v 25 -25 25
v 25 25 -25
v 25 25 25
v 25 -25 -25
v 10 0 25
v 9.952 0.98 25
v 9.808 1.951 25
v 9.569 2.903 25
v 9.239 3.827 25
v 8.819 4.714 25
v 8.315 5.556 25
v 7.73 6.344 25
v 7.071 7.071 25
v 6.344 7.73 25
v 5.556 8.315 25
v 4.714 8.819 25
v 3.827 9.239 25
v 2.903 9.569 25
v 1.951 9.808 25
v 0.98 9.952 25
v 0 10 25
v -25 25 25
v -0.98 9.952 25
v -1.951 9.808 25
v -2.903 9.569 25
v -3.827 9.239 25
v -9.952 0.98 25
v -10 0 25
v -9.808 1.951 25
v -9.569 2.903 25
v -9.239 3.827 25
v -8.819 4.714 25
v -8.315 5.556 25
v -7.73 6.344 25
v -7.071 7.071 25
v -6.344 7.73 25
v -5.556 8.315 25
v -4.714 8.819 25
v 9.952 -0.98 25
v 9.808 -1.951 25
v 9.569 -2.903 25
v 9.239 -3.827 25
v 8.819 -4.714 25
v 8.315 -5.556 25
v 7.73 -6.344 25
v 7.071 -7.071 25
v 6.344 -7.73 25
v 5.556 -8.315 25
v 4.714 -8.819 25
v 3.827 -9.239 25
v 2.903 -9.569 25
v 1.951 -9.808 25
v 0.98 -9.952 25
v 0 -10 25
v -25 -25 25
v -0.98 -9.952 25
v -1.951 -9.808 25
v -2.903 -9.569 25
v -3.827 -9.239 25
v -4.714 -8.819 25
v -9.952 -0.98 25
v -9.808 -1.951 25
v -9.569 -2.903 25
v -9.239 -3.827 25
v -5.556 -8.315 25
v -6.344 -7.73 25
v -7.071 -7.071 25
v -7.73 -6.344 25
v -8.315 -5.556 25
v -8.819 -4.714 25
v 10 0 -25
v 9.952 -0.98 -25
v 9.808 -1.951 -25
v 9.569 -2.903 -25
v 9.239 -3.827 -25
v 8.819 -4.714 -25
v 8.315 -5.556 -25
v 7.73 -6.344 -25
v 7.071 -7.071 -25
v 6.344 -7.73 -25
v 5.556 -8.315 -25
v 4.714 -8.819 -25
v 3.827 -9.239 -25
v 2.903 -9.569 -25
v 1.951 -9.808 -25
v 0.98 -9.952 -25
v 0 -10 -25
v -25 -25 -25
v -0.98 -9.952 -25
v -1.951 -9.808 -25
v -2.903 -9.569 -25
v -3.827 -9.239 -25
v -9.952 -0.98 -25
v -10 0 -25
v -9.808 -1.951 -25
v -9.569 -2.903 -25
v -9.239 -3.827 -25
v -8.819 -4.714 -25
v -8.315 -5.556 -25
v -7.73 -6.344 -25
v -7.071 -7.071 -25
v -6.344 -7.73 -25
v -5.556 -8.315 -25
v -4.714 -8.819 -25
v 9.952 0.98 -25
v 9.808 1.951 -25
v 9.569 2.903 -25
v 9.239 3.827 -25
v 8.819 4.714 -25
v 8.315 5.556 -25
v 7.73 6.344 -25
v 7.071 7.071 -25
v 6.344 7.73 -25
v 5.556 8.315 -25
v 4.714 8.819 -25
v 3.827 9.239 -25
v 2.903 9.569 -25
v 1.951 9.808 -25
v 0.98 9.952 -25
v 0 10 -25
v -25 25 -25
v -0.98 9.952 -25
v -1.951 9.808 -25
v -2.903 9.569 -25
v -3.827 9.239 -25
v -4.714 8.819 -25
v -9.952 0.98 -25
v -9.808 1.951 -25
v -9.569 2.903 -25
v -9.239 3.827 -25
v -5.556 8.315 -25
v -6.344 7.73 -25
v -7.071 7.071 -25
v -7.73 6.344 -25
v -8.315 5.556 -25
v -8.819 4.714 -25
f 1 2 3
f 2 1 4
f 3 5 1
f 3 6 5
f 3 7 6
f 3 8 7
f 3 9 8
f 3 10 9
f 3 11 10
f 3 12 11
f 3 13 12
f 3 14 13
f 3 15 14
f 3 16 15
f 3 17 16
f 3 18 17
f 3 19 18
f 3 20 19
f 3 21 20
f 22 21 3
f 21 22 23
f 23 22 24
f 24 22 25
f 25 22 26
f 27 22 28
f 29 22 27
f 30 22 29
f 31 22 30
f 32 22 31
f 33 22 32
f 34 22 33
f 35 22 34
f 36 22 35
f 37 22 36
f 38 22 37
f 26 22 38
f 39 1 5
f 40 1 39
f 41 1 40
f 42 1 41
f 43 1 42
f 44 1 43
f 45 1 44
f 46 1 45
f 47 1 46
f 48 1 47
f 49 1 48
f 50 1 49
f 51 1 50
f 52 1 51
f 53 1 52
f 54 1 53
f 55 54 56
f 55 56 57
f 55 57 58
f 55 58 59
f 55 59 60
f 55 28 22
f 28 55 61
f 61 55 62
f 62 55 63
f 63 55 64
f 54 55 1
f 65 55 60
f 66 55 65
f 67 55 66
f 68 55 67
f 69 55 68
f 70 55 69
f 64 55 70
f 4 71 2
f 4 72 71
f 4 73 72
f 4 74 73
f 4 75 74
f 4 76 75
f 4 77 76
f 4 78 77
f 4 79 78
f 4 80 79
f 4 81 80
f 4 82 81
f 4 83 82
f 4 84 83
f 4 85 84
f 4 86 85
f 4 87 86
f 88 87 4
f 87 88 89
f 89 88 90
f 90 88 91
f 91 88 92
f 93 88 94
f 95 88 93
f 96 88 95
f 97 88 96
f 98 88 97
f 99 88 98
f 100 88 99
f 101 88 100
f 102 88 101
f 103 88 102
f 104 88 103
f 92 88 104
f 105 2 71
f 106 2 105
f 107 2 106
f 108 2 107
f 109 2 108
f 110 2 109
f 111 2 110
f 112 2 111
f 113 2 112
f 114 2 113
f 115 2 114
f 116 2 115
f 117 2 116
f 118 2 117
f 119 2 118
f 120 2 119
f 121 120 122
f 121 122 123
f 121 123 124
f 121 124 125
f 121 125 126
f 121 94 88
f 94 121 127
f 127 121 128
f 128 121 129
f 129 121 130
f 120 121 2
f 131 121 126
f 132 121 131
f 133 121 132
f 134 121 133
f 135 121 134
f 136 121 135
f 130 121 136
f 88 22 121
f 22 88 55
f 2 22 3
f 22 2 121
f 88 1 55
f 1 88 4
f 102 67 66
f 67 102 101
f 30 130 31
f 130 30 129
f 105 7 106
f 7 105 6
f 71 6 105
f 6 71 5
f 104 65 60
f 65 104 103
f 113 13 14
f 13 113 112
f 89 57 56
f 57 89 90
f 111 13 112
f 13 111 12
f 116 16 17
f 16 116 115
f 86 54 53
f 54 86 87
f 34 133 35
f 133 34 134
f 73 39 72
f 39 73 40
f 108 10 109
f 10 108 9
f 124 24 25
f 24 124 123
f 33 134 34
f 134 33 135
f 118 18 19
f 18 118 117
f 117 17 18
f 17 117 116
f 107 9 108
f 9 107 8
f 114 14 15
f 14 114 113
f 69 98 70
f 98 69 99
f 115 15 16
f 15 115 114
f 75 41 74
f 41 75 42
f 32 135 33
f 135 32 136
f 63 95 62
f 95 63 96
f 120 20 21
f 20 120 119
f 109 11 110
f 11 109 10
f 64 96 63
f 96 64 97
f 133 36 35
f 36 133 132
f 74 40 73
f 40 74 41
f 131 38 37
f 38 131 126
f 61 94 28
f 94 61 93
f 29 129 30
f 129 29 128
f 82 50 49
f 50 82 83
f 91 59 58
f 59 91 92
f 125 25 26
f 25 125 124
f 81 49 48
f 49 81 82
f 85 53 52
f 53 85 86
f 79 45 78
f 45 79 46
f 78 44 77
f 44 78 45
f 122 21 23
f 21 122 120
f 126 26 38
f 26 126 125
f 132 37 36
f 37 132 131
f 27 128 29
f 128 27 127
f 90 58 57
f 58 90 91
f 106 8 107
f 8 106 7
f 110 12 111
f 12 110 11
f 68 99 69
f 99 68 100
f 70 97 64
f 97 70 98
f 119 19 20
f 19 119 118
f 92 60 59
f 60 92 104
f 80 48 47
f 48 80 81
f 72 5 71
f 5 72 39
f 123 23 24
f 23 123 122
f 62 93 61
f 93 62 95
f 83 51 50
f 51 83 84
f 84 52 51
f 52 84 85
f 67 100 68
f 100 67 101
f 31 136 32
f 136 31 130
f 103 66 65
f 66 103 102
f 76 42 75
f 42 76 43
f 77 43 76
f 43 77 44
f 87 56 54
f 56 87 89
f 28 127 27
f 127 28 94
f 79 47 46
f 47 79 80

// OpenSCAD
difference() {
    // 50mm 角の立方体(中心に配置)
    cube([50, 50, 50], center = true);

    // 直径 20mm の貫通穴(z 軸方向)
    cylinder(h = 52, d = 20, center = true, $fn = 64);
}
